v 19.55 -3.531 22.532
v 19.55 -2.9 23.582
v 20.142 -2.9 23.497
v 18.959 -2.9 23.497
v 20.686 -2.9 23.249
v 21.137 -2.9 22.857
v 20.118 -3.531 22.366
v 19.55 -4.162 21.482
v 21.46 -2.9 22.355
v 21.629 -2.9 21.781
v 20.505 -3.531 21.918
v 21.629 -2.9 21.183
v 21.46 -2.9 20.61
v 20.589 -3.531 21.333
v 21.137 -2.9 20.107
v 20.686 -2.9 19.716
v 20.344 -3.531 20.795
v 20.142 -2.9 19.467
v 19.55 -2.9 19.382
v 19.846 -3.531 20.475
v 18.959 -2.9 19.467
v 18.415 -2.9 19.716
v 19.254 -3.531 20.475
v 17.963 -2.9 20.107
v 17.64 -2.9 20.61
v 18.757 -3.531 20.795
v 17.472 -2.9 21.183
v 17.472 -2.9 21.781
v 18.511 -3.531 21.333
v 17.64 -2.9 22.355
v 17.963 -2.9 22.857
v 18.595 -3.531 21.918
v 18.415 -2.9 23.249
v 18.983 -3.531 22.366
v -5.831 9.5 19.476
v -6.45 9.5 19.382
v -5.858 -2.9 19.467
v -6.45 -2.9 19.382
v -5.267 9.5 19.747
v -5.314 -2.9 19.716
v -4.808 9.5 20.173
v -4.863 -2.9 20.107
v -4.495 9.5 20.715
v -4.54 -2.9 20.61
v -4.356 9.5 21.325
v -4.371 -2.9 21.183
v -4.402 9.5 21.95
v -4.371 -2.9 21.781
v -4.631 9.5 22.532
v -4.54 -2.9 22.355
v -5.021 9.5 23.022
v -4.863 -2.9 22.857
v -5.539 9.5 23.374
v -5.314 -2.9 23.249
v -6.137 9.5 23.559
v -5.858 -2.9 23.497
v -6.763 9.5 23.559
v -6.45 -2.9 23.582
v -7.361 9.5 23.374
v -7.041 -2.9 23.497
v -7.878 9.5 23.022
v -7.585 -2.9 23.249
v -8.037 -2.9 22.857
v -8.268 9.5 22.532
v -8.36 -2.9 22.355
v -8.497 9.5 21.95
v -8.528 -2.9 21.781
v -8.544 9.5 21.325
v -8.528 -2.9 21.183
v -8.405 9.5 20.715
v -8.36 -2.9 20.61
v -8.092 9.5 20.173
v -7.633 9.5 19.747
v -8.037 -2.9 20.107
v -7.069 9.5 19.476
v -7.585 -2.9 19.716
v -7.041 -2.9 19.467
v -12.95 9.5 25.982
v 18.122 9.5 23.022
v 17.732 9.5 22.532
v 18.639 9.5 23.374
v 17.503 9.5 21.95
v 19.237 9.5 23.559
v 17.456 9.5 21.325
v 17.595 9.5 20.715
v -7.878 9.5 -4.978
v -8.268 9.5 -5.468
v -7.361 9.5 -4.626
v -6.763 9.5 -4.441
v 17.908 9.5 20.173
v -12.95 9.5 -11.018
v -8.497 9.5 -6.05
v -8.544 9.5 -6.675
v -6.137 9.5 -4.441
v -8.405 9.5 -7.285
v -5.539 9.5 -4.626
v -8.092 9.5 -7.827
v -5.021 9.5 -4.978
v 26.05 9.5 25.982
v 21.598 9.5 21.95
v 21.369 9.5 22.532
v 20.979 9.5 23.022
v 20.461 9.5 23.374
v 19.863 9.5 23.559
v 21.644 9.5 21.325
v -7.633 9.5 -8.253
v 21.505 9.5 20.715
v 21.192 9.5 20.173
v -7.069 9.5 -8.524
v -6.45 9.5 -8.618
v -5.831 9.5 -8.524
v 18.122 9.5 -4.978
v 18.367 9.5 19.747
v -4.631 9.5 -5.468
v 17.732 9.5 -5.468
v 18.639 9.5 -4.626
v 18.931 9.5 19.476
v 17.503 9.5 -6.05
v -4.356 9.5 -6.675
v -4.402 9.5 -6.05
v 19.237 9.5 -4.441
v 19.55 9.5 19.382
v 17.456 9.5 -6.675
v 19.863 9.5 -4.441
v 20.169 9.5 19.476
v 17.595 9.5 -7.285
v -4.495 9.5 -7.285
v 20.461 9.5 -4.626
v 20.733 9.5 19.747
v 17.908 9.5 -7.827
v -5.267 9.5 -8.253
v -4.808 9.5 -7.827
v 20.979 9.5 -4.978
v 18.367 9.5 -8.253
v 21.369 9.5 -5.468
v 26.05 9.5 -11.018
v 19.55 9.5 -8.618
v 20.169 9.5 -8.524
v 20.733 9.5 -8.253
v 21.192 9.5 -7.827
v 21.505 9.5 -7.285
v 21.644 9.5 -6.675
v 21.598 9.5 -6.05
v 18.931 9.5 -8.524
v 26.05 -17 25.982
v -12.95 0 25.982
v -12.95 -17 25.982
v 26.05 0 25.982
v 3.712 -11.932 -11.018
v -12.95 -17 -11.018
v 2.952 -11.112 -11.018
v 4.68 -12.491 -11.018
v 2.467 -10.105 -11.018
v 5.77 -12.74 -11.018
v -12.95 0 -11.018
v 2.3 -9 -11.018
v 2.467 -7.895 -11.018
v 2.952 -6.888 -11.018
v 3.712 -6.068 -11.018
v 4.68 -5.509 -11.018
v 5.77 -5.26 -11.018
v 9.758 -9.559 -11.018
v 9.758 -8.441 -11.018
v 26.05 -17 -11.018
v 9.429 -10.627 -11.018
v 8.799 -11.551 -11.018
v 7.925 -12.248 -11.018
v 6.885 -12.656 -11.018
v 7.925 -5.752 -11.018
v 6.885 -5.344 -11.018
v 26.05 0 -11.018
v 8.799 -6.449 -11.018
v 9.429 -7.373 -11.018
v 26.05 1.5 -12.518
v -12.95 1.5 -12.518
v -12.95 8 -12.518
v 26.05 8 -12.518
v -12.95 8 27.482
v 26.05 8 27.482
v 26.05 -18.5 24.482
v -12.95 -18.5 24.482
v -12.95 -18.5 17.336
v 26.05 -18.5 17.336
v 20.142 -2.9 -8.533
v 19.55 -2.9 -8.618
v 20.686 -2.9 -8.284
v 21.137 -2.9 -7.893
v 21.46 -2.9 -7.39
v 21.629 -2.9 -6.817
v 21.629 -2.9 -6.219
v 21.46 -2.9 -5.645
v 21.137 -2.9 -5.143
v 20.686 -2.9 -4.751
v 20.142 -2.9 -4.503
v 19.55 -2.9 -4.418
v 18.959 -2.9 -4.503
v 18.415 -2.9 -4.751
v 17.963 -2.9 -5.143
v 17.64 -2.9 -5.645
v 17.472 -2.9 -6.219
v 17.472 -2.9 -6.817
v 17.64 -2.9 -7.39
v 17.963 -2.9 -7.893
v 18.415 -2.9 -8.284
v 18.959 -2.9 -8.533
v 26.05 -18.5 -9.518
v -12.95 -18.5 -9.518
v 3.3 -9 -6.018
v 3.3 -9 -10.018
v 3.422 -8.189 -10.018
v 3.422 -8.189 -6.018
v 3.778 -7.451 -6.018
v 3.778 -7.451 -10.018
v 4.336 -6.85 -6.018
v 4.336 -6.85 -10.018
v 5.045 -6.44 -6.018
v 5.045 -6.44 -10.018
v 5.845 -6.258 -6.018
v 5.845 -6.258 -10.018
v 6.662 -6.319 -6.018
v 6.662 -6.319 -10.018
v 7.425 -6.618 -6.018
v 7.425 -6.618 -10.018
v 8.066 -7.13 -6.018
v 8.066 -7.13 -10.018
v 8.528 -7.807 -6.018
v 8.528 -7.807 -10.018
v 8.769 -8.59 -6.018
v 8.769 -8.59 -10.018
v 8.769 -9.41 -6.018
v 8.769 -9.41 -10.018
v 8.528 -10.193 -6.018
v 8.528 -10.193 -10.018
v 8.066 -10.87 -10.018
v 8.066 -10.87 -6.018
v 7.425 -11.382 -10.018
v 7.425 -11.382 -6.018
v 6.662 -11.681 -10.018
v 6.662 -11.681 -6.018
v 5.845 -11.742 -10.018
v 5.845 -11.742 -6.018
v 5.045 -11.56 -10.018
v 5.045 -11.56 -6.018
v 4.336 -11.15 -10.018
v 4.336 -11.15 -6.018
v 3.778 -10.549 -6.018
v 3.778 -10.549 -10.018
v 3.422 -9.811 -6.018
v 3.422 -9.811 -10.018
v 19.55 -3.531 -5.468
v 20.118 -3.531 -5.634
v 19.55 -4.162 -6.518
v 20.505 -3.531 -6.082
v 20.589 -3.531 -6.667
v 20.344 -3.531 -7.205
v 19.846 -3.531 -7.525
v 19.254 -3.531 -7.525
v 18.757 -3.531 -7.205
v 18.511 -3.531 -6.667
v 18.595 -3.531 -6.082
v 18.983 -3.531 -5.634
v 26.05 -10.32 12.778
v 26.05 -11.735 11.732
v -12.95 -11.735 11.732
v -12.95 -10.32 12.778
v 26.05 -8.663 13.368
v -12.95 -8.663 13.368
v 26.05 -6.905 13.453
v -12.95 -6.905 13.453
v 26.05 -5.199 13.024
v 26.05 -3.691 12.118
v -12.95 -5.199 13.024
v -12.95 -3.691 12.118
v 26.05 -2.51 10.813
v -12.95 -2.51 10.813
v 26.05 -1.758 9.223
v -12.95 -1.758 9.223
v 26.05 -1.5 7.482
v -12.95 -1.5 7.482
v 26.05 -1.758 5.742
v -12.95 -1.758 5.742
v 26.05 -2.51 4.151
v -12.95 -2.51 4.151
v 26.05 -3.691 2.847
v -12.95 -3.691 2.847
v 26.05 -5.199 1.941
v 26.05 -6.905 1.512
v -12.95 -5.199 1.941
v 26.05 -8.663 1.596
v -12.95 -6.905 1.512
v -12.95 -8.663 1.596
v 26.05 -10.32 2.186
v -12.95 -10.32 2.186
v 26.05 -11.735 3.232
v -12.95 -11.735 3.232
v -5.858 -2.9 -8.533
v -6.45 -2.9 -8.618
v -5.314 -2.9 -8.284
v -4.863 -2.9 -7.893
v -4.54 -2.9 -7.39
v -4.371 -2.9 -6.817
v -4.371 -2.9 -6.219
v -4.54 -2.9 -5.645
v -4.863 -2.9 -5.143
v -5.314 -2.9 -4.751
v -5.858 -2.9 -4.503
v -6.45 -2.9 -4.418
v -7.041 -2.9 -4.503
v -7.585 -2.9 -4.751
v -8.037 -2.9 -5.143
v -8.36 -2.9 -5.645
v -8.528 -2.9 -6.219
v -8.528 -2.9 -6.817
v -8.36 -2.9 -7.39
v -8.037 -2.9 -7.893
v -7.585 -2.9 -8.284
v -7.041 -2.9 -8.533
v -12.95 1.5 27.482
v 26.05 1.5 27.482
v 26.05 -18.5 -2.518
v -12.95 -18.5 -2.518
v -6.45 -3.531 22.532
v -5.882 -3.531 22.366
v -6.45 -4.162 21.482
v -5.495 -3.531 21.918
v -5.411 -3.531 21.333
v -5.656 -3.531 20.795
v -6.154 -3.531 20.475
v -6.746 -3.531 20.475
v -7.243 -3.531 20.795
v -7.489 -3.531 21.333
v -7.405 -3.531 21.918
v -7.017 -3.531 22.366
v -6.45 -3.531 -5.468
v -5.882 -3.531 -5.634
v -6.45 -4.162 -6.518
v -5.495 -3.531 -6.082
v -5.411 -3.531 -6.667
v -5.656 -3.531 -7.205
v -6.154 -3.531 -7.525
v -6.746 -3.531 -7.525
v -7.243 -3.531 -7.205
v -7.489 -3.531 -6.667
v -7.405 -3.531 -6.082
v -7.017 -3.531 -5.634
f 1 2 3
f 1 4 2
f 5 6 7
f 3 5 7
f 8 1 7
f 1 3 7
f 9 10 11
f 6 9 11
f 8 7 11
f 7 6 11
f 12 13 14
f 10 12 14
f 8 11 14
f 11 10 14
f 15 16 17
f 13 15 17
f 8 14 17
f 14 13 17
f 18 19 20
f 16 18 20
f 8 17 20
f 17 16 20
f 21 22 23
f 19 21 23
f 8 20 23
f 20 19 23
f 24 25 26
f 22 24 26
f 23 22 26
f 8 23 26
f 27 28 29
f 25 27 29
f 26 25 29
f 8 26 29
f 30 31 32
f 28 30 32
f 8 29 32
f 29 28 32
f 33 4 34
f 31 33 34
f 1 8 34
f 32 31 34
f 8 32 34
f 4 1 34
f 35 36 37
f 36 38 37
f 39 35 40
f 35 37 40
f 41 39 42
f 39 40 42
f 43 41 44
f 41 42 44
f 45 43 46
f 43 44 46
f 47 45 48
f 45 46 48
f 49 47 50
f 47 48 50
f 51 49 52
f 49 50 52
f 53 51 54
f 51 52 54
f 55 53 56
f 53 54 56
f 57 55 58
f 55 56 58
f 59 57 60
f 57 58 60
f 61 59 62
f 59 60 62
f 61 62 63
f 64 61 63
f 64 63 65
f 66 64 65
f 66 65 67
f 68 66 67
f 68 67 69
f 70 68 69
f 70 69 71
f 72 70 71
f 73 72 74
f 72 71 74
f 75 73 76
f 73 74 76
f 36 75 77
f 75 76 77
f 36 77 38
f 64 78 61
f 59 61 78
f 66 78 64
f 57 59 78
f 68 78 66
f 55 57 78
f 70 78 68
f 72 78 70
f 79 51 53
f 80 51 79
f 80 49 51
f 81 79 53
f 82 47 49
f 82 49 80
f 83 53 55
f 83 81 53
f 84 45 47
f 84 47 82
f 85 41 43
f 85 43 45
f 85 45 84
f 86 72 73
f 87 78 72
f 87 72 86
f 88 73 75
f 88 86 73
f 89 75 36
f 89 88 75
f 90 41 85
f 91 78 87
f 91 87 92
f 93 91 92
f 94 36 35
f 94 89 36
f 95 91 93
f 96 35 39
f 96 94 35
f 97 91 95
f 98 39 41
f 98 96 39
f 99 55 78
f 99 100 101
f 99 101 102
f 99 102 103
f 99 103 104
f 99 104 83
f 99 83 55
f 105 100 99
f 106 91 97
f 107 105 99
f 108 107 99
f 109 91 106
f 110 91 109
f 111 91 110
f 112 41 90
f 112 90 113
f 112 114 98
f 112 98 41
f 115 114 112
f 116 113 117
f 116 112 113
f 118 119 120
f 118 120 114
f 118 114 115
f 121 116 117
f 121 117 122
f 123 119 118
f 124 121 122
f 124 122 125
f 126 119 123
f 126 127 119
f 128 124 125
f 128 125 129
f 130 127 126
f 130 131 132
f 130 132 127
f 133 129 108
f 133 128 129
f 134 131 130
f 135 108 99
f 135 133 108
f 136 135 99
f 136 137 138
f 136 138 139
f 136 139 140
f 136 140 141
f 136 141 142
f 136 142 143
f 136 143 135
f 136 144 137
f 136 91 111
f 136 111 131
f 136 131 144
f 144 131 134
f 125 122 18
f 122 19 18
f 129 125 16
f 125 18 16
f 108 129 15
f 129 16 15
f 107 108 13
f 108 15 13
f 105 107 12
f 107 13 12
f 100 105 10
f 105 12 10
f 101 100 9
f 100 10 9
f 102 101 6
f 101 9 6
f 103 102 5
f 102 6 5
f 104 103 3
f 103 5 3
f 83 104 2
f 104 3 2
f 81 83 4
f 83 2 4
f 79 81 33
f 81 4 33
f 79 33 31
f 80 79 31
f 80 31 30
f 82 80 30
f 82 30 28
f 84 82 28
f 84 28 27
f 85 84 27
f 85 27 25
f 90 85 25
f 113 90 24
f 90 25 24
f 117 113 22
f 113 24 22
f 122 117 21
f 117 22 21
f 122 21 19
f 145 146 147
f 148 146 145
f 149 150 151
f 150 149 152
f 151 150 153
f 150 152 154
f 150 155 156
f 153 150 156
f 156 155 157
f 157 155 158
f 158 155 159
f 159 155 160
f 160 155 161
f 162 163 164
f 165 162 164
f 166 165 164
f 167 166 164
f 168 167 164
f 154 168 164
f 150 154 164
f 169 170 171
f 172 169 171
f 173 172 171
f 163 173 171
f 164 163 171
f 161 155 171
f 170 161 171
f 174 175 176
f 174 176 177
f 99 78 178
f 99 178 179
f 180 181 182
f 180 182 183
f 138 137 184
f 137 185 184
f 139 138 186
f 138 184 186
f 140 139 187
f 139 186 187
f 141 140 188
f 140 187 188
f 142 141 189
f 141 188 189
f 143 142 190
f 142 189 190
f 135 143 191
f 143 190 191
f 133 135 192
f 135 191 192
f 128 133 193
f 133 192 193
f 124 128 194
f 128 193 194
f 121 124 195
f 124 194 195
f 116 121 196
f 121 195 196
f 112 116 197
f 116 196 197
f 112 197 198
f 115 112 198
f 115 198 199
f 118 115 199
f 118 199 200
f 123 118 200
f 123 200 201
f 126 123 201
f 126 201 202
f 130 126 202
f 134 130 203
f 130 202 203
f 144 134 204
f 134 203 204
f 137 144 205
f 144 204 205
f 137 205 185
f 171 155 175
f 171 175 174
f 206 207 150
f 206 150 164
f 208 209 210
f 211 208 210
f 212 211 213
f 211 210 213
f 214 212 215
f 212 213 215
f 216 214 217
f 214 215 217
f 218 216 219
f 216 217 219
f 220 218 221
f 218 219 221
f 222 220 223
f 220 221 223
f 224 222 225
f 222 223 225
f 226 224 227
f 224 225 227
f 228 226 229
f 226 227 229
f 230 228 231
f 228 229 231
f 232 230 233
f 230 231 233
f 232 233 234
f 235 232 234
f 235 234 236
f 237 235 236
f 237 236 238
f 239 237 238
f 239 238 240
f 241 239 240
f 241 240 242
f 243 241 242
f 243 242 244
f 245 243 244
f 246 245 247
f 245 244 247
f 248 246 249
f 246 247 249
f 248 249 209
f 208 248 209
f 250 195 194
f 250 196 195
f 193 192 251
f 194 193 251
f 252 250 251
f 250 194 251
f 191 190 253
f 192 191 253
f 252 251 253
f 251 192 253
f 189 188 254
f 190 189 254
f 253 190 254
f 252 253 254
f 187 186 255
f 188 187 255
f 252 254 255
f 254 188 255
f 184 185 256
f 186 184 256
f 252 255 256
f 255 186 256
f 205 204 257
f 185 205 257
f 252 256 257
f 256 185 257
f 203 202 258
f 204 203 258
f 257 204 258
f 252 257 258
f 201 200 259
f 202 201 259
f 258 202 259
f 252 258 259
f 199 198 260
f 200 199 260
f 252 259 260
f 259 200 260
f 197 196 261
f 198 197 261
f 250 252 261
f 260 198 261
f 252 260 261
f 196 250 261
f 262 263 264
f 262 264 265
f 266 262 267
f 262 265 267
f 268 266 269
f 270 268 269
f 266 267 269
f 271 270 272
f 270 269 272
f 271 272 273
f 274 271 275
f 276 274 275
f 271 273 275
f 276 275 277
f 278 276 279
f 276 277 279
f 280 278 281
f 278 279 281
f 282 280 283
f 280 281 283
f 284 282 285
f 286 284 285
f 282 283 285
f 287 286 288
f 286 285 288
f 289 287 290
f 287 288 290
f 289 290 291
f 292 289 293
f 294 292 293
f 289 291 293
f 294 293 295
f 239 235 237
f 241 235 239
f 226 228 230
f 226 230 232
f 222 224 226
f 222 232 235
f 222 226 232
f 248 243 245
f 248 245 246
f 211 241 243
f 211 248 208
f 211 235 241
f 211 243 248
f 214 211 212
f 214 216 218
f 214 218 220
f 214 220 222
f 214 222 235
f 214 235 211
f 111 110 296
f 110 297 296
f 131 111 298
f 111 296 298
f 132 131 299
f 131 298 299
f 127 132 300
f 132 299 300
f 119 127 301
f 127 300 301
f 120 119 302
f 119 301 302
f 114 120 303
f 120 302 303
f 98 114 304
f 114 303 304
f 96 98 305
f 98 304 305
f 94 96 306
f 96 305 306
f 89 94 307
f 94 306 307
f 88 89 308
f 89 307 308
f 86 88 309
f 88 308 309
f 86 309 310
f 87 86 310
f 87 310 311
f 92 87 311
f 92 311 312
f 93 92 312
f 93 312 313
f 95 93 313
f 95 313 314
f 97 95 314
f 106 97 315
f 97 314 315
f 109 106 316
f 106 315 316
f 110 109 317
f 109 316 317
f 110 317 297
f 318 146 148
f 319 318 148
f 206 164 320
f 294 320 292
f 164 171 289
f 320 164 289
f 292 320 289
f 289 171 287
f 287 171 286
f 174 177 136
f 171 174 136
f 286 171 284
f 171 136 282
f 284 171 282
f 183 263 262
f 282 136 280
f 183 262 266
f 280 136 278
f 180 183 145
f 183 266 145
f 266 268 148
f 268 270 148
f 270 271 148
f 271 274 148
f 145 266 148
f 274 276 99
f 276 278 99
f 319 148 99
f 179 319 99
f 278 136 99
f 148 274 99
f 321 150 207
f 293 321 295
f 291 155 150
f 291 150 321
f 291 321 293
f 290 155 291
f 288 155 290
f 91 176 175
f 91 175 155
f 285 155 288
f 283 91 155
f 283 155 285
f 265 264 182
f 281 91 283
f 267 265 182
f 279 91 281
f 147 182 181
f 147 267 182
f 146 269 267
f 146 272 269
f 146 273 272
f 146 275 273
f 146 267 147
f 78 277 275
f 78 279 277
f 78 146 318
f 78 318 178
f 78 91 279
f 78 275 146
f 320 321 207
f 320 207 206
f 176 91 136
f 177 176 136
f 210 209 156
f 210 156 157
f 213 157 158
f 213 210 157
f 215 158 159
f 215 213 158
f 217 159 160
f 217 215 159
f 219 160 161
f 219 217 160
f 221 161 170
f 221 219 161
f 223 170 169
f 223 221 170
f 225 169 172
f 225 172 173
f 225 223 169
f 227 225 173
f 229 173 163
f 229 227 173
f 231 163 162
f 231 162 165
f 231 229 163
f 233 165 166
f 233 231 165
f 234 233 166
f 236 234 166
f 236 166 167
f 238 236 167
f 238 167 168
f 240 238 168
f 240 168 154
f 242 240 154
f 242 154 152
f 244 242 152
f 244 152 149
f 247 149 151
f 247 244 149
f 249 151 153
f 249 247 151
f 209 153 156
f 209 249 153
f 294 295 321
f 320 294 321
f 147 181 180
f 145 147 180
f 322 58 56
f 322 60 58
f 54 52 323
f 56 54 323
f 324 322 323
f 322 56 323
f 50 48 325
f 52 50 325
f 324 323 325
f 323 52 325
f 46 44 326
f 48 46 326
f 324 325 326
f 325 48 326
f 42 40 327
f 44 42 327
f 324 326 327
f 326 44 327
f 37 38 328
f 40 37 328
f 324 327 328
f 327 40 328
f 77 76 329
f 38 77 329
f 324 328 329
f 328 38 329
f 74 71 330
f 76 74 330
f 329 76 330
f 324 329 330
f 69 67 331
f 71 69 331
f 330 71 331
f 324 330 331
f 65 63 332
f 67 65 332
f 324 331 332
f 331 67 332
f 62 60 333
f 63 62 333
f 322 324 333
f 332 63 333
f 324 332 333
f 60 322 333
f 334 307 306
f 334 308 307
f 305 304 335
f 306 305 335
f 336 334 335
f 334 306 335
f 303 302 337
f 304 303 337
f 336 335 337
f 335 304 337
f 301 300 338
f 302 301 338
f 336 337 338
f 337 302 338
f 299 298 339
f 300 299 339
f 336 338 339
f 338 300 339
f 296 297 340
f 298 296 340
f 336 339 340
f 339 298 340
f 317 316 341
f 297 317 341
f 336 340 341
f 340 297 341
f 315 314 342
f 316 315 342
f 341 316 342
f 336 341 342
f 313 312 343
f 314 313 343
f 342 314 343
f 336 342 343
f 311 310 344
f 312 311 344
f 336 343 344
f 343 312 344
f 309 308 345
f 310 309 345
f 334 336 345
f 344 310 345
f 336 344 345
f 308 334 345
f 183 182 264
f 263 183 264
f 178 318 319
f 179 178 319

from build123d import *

# Parameters (mm, degrees)
ESQUISSE1_W               = 39
ESQUISSE1_H               = 40
EXTRUSION1_DEPTH          = 9.5
CHANFREIN1_SIZE           = 1.5
ESQUISSE5_W               = 39
ESQUISSE5_H               = 37
EXTRUSION2_DEPTH          = 18.5
CHANFREIN2_SIZE           = 1.5
ESQUISSE6_R               = 2.75
EXTRUSION3_DEPTH          = 5
CHANFREIN3_SIZE           = 1
TROU_TARAUD_M5X0_81_D     = 4.2
TROU_TARAUD_M5X0_81_DEPTH = 12.4
TROU_TARAUD_M5X0_81_TIP   = 1.2618073
EXTRUSION4_DEPTH          = 52.171504892


with BuildPart() as part:
    # Esquisse1 → Extrusion1 (new body)
    with BuildSketch(Plane(origin=(0, 0, 0), x_dir=(1, 0, 0), z_dir=(0, 1, 0))):
        with Locations((6.550185129, -7.482229039)):
            Rectangle(ESQUISSE1_W, ESQUISSE1_H)
    extrude(amount=EXTRUSION1_DEPTH)

    # Chanfrein1
    chanfrein1_edges = [part.edges().sort_by_distance(p)[0] for p in [
        (6.550185129, 9.5, -12.517770961),
        (6.550185129, 0, -12.517770961),
        (6.550185129, 0, 27.482229039),
        (6.550185129, 9.5, 27.482229039),
    ]]
    chamfer(chanfrein1_edges, length=CHANFREIN1_SIZE)

    # Esquisse5 → Extrusion2 (add)
    with BuildSketch(Plane.XZ):
        with Locations((6.550185129, 7.482229039)):
            Rectangle(ESQUISSE5_W, ESQUISSE5_H)
    extrude(amount=EXTRUSION2_DEPTH)

    # Chanfrein2
    chanfrein2_edges = [part.edges().sort_by_distance(p)[0] for p in [
        (6.550185129, -18.5, -11.017770961),
        (6.550185129, -18.5, 25.982229039),
    ]]
    chamfer(chanfrein2_edges, length=CHANFREIN2_SIZE)

    # Esquisse6 → Extrusion3 (cut)
    with BuildSketch(Plane(origin=(0, 0, -11.017770961), x_dir=(-1, 0, 0), z_dir=(0, 0, -1))):
        with Locations((-6.050185129, -9)):
            Circle(ESQUISSE6_R)
    extrude(amount=-EXTRUSION3_DEPTH, mode=Mode.SUBTRACT)

    # Chanfrein3
    chanfrein3_edges = [part.edges().sort_by_distance(p)[0] for p in [
        (8.800185129, -9, -11.017770961),
    ]]
    chamfer(chanfrein3_edges, length=CHANFREIN3_SIZE)

    # Trou taraudé M5x0.81
    with Locations(Plane(origin=(-6.449814871, 9.5, -6.517770961), x_dir=(0, 0, 1), z_dir=(0, 1, 0))):
        with Locations((0, 0), (0, 26), (28, 26), (28, 0)):
            Hole(TROU_TARAUD_M5X0_81_D / 2, depth=TROU_TARAUD_M5X0_81_DEPTH)
            with Locations((0, 0, -(TROU_TARAUD_M5X0_81_DEPTH + TROU_TARAUD_M5X0_81_TIP / 2))):  # 118° drill point
                Cone(0, TROU_TARAUD_M5X0_81_D / 2, TROU_TARAUD_M5X0_81_TIP, mode=Mode.SUBTRACT)

    # Esquisse8 → Extrusion4 (cut, through all)
    with BuildSketch(Plane.ZY.offset(12.949814871)):
        with BuildLine():
            Line((3.232229039, -11.735268587), (-2.517770961, -18.5))
            Line((-2.517770961, -18.5), (17.335579002, -18.5))
            Line((17.335579002, -18.5), (11.732229039, -11.735268587))
            ThreePointArc((11.732229039, -11.735268587), (7.482229039, -1.5), (3.232229039, -11.735268587))
        make_face()
    extrude(amount=-EXTRUSION4_DEPTH, mode=Mode.SUBTRACT)


solid = part.part
